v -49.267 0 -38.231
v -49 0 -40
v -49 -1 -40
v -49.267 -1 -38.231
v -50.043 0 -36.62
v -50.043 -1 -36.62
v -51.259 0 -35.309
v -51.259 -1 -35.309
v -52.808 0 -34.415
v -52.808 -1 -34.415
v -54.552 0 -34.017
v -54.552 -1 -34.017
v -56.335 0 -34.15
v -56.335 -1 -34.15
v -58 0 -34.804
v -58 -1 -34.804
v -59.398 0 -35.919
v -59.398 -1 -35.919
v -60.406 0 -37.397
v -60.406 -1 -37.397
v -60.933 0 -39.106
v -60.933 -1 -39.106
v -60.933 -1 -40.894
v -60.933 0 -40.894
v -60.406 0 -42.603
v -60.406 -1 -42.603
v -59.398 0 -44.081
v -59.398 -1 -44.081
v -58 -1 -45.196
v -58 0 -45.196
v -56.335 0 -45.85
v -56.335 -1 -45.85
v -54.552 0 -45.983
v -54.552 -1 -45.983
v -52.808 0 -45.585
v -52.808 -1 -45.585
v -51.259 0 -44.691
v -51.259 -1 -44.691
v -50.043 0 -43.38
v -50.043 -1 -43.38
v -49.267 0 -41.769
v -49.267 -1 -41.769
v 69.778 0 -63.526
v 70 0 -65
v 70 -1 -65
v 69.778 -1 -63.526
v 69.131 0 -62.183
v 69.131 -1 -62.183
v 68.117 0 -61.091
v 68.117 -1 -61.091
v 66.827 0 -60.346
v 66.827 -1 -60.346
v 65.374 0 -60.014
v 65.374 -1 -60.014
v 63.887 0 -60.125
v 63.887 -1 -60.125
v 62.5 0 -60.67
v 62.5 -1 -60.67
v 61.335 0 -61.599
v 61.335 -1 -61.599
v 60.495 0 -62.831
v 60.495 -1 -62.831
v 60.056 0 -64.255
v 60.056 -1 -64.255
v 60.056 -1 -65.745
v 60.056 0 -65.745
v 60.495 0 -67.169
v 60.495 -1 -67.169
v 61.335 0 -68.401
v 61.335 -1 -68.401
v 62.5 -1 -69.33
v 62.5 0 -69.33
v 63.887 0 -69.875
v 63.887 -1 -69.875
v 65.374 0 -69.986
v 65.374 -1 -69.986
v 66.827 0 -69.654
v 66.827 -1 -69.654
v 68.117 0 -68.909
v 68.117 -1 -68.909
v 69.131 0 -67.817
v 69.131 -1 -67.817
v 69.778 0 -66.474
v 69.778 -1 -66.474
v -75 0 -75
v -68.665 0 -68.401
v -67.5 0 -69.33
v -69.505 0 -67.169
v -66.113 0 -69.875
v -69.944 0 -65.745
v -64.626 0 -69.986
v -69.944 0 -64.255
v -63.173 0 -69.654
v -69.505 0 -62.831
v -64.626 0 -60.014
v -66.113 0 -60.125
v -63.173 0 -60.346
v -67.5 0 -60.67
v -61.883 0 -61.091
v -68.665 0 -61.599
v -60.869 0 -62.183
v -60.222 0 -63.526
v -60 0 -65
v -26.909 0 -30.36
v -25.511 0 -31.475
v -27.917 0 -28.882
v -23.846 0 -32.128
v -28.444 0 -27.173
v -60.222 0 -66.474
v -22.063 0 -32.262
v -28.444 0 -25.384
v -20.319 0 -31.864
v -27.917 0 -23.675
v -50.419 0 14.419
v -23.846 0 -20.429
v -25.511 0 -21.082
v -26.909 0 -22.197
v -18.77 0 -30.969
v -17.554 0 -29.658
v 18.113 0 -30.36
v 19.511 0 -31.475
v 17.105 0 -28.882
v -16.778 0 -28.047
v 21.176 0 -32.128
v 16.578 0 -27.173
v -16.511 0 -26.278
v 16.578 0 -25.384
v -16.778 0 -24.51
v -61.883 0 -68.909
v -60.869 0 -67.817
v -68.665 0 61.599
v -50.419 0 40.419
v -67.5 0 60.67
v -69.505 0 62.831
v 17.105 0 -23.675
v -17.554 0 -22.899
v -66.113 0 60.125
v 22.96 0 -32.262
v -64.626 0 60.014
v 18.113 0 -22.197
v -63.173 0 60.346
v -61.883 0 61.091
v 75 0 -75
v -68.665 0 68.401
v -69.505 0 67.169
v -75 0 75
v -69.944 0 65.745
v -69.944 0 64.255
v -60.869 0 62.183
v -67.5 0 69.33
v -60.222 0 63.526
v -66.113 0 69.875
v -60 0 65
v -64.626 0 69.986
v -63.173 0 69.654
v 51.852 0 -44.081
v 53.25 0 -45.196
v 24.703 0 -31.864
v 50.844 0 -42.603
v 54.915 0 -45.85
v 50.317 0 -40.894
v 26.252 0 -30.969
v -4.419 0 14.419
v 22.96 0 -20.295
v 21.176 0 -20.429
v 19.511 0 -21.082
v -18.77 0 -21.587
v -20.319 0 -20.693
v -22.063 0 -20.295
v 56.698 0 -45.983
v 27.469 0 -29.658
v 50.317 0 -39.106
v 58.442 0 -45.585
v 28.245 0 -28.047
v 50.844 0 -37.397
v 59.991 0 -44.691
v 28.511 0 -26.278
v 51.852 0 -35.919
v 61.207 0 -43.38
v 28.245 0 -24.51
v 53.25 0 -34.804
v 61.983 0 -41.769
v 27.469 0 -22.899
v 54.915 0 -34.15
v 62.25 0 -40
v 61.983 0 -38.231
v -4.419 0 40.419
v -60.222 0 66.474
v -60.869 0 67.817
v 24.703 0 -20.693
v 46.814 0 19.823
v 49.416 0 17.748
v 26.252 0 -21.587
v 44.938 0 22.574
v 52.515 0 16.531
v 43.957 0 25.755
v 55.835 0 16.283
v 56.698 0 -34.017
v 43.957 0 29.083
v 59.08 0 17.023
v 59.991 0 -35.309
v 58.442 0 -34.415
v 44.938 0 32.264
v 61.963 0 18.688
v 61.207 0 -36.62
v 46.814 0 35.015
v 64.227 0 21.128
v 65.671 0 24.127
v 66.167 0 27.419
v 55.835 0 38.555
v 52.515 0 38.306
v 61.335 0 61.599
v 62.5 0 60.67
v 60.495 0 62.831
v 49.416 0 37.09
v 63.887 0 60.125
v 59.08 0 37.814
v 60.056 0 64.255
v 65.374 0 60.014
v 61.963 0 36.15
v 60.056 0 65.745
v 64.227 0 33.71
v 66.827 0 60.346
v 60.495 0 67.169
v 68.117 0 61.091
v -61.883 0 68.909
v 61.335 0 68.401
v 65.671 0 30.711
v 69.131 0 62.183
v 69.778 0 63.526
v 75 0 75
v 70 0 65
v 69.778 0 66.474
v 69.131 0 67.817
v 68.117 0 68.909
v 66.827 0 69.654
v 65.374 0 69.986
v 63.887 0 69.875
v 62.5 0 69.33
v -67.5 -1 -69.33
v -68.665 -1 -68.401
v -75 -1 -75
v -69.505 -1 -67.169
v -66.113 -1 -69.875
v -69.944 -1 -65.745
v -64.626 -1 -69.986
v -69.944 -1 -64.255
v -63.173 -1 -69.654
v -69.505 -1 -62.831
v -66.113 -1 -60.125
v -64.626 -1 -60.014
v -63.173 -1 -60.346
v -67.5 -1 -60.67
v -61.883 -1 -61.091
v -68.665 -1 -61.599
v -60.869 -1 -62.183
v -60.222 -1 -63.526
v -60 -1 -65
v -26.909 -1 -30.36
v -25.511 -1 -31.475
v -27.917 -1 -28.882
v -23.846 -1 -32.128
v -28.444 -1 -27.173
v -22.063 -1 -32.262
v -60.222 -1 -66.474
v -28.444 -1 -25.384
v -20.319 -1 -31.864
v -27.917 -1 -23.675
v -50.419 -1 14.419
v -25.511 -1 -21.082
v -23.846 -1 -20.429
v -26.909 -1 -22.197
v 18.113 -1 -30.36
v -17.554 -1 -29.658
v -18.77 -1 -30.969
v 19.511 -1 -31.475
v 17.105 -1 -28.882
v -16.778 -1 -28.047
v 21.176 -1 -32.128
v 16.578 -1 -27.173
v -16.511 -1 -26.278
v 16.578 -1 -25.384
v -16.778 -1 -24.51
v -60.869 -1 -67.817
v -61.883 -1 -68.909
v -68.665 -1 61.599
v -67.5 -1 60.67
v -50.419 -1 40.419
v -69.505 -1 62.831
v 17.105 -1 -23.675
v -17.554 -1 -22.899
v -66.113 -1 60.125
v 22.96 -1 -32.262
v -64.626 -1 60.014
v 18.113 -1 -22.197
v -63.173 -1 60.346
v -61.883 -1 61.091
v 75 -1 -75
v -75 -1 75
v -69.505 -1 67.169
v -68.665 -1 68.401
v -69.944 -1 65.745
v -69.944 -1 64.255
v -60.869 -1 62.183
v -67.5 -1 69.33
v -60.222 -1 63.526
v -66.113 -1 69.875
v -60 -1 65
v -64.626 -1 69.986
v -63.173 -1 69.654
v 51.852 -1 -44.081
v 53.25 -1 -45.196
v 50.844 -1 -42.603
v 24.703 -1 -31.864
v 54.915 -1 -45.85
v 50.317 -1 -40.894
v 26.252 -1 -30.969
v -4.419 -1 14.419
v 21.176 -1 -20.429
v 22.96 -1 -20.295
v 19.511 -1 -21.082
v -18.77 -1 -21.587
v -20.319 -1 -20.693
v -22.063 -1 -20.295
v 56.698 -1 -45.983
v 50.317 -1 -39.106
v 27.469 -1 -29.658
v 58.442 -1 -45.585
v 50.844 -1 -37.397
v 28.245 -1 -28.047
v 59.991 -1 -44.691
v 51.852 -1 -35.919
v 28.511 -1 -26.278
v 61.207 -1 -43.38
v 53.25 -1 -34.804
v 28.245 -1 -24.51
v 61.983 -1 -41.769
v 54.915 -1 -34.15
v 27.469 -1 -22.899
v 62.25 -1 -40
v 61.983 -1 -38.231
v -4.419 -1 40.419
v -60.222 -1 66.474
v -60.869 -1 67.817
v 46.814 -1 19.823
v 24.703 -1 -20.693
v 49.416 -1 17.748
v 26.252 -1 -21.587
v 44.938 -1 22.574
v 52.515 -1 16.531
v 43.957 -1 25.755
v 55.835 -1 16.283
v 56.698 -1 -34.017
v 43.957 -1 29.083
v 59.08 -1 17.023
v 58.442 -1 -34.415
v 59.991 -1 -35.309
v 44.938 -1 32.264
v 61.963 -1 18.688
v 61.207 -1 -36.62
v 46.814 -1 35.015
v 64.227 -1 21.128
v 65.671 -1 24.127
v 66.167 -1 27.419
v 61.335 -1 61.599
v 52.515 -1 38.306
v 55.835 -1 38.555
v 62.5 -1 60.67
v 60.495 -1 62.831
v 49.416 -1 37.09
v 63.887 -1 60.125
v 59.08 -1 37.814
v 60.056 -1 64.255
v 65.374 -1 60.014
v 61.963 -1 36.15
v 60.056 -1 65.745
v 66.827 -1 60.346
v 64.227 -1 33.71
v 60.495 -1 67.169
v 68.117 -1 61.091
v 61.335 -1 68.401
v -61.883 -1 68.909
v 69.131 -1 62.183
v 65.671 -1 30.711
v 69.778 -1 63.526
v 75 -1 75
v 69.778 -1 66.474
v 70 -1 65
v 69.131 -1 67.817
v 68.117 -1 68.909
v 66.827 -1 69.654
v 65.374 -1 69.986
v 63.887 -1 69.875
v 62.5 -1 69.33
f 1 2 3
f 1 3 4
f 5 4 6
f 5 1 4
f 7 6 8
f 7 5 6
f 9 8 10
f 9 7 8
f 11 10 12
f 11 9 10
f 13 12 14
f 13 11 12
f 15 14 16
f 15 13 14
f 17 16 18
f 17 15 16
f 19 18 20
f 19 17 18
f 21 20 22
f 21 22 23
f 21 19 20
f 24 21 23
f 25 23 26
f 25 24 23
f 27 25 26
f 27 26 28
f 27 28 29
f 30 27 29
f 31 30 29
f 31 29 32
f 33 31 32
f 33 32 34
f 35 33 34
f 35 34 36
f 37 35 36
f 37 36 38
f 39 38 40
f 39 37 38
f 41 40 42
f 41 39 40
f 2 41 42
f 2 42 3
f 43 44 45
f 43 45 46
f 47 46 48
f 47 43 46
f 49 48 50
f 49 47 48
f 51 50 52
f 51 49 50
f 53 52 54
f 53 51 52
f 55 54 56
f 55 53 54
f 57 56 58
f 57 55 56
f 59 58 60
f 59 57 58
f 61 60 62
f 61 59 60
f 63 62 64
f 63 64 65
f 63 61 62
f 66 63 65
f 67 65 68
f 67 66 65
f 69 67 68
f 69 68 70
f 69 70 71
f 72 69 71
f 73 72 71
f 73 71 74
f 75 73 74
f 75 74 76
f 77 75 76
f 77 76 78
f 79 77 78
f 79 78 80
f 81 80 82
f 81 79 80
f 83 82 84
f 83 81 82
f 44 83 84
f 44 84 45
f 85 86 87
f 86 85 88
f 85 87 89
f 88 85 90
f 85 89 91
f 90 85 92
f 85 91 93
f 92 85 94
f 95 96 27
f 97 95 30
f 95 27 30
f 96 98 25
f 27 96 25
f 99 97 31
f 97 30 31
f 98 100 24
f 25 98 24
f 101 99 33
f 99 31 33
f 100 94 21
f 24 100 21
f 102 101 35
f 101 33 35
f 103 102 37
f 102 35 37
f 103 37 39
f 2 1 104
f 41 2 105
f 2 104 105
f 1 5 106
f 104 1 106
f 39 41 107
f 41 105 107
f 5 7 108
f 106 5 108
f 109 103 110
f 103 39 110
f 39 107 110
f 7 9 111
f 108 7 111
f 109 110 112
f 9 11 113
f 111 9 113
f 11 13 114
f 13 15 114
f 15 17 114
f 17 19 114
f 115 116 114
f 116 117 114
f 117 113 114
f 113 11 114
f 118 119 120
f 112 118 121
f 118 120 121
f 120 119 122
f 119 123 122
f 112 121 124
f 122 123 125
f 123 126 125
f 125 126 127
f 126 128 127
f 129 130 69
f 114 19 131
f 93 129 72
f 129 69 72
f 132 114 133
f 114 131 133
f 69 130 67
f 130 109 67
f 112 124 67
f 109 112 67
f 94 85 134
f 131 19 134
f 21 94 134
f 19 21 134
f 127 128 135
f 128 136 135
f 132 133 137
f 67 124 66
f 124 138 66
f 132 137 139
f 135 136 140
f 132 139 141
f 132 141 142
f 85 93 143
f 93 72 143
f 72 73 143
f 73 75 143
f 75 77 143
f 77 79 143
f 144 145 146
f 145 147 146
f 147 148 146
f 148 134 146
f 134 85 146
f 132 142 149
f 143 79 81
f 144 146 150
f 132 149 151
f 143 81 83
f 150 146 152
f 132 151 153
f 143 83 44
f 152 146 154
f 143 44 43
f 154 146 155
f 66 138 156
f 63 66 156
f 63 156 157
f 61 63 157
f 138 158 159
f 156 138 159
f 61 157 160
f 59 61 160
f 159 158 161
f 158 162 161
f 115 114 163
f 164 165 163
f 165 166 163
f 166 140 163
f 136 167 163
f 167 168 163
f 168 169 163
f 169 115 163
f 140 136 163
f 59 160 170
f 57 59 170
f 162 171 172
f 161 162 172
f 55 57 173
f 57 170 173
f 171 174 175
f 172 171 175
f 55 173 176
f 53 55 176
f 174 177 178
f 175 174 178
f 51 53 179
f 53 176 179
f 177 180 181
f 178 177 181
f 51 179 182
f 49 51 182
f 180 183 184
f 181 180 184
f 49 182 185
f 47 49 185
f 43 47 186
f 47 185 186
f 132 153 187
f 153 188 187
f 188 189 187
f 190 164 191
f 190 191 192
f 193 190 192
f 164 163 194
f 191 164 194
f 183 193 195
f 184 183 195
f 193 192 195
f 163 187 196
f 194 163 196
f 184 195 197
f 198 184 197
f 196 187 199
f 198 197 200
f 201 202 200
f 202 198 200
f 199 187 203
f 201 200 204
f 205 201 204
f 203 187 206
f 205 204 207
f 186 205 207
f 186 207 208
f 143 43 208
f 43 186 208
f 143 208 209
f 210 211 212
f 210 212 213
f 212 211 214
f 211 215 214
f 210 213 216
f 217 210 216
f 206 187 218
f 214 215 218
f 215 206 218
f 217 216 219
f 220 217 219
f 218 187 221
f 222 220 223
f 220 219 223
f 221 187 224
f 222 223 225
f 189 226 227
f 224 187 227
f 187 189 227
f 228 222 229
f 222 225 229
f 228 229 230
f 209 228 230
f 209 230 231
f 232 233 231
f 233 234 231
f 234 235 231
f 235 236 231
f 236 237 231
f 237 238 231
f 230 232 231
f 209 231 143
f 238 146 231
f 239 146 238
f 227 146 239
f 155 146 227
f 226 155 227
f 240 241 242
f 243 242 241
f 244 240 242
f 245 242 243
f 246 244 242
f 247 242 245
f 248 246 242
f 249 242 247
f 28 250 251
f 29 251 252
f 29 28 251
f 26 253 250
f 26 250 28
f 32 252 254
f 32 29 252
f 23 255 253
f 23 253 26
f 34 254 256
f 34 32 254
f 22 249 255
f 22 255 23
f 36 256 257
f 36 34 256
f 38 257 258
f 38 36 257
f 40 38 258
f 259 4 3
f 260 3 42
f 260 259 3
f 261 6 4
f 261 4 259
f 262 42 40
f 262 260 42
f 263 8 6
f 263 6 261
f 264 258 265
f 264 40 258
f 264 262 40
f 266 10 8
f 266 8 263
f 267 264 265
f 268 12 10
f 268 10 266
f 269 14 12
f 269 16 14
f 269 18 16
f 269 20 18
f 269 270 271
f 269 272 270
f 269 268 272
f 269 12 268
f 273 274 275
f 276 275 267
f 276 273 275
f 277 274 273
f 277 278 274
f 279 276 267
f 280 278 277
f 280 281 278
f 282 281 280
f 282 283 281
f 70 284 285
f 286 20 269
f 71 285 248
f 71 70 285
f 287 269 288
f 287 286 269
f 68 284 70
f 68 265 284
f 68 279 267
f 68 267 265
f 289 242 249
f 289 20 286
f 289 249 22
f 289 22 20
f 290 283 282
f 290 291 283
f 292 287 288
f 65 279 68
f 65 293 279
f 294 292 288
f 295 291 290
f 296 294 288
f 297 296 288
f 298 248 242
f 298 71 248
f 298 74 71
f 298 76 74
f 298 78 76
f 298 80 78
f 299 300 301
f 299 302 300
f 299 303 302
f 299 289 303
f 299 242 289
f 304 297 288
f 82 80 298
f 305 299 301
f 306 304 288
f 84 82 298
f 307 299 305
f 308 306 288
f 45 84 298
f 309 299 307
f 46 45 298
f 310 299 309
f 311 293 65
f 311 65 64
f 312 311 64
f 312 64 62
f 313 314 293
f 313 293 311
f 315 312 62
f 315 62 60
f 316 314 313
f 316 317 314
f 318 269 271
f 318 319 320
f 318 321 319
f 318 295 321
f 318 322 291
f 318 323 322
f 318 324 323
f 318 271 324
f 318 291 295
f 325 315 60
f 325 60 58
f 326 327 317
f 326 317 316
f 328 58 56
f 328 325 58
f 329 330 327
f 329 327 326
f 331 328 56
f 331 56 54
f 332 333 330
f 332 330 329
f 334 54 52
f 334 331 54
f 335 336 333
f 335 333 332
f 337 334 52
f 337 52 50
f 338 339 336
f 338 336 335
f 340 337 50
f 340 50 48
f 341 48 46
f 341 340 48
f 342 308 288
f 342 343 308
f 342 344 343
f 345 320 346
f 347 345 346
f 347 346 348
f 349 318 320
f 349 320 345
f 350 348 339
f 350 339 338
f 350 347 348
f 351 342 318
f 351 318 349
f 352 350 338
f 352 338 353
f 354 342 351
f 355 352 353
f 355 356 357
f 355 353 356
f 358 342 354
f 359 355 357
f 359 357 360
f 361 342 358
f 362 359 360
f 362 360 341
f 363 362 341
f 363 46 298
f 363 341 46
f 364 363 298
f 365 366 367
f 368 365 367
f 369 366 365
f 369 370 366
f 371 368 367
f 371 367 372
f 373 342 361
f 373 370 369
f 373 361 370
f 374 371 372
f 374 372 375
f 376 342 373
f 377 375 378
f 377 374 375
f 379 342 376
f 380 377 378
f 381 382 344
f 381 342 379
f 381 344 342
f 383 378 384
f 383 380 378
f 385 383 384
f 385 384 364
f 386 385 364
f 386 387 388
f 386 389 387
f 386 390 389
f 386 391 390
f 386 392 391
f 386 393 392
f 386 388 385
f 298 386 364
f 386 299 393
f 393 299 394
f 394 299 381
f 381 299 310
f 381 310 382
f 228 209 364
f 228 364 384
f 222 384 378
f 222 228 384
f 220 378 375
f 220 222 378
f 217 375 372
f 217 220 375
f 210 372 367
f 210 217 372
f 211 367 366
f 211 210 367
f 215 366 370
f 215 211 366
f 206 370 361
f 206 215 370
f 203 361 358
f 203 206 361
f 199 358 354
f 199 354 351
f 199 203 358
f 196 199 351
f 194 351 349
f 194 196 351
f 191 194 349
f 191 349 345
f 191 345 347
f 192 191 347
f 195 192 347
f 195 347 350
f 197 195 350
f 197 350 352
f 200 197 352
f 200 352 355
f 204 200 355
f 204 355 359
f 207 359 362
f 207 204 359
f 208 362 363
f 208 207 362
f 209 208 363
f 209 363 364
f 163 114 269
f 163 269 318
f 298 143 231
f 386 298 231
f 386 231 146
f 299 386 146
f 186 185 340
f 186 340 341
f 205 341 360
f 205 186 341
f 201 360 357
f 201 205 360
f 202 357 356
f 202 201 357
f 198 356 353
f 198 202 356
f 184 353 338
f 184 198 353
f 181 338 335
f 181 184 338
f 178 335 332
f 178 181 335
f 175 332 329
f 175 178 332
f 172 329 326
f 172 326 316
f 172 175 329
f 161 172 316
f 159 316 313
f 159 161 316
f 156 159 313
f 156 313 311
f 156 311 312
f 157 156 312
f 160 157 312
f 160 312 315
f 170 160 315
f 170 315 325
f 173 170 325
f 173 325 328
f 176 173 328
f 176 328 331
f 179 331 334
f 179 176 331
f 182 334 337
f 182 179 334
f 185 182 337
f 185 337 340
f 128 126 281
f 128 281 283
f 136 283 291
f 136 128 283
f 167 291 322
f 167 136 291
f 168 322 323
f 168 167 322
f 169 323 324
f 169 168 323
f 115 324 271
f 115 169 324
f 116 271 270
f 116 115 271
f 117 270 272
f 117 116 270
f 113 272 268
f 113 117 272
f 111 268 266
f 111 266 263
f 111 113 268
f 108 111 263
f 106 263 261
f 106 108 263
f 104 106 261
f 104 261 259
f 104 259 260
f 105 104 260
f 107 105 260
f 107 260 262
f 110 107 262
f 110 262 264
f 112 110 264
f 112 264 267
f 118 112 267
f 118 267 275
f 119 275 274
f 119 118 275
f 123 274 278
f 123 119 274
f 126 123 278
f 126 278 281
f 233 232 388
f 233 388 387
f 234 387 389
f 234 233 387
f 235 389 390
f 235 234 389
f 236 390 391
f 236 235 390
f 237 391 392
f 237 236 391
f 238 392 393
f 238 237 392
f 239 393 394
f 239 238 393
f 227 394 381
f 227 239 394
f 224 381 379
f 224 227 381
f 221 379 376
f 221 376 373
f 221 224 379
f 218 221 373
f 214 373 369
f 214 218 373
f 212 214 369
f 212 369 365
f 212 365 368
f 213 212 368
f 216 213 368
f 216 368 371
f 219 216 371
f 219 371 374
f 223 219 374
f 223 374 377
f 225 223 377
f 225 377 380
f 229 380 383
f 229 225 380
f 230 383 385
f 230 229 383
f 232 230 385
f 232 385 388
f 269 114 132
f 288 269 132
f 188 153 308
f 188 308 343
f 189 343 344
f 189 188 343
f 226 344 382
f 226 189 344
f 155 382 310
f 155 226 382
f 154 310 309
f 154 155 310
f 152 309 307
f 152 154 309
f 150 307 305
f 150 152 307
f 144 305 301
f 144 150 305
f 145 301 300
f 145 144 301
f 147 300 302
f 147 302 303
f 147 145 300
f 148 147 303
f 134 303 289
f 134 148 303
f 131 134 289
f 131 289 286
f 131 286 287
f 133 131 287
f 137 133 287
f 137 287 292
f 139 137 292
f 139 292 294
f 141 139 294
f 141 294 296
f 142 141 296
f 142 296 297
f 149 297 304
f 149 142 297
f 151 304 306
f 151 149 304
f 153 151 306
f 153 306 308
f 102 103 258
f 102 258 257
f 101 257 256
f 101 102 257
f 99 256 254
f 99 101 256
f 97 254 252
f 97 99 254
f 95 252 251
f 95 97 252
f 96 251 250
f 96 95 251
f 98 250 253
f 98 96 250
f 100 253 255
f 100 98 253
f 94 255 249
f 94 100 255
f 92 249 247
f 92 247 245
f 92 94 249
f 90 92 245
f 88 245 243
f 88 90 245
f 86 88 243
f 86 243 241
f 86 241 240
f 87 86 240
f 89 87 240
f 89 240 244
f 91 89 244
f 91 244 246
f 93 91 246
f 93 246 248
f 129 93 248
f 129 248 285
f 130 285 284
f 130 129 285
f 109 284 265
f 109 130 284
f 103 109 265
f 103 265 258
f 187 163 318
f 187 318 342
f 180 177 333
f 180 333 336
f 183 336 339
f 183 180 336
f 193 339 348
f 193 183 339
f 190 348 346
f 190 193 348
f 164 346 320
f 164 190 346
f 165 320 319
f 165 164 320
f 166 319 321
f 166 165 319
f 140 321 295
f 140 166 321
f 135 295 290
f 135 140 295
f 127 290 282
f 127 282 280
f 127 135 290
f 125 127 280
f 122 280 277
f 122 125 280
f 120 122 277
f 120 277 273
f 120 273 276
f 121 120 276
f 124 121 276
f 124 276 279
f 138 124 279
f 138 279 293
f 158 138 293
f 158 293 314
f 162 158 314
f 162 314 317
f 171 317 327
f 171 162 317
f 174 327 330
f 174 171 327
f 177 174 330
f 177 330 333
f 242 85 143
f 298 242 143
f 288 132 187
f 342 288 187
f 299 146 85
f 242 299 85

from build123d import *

# Parameters (mm, degrees)
F0_R     = 5
F0_R_2   = 6
F0_W     = 46
F0_H     = 26
F0_R_3   = 11.167495
F1_DEPTH = 1


with BuildPart() as f1:
    # F0 (on Front) → F1 (new body)
    with BuildSketch(Plane.XZ):
        Polygon((75, -75), (75, 75), (-75, 75), (-75, 15), (-75, 0), (-75, -75), align=None)
        with Locations((-65, -65)):
            Circle(F0_R, mode=Mode.SUBTRACT)
        with Locations((-55, -40)):
            Circle(F0_R_2, mode=Mode.SUBTRACT)
        with Locations((-22.511177, -26.278466)):
            Circle(F0_R_2, mode=Mode.SUBTRACT)
        with Locations((65, -65)):
            Circle(F0_R, mode=Mode.SUBTRACT)
        with Locations((56.25, -40)):
            Circle(F0_R_2, mode=Mode.SUBTRACT)
        with Locations((22.511177, -26.278466)):
            Circle(F0_R_2, mode=Mode.SUBTRACT)
        with Locations((-27.41893, 27.41893)):
            Rectangle(F0_W, F0_H, mode=Mode.SUBTRACT)
        with Locations((-65, 65)):
            Circle(F0_R, mode=Mode.SUBTRACT)
        with Locations((55, 27.41893)):
            Circle(F0_R_3, mode=Mode.SUBTRACT)
        with Locations((65, 65)):
            Circle(F0_R, mode=Mode.SUBTRACT)
    extrude(amount=F1_DEPTH)


solid = f1.part
